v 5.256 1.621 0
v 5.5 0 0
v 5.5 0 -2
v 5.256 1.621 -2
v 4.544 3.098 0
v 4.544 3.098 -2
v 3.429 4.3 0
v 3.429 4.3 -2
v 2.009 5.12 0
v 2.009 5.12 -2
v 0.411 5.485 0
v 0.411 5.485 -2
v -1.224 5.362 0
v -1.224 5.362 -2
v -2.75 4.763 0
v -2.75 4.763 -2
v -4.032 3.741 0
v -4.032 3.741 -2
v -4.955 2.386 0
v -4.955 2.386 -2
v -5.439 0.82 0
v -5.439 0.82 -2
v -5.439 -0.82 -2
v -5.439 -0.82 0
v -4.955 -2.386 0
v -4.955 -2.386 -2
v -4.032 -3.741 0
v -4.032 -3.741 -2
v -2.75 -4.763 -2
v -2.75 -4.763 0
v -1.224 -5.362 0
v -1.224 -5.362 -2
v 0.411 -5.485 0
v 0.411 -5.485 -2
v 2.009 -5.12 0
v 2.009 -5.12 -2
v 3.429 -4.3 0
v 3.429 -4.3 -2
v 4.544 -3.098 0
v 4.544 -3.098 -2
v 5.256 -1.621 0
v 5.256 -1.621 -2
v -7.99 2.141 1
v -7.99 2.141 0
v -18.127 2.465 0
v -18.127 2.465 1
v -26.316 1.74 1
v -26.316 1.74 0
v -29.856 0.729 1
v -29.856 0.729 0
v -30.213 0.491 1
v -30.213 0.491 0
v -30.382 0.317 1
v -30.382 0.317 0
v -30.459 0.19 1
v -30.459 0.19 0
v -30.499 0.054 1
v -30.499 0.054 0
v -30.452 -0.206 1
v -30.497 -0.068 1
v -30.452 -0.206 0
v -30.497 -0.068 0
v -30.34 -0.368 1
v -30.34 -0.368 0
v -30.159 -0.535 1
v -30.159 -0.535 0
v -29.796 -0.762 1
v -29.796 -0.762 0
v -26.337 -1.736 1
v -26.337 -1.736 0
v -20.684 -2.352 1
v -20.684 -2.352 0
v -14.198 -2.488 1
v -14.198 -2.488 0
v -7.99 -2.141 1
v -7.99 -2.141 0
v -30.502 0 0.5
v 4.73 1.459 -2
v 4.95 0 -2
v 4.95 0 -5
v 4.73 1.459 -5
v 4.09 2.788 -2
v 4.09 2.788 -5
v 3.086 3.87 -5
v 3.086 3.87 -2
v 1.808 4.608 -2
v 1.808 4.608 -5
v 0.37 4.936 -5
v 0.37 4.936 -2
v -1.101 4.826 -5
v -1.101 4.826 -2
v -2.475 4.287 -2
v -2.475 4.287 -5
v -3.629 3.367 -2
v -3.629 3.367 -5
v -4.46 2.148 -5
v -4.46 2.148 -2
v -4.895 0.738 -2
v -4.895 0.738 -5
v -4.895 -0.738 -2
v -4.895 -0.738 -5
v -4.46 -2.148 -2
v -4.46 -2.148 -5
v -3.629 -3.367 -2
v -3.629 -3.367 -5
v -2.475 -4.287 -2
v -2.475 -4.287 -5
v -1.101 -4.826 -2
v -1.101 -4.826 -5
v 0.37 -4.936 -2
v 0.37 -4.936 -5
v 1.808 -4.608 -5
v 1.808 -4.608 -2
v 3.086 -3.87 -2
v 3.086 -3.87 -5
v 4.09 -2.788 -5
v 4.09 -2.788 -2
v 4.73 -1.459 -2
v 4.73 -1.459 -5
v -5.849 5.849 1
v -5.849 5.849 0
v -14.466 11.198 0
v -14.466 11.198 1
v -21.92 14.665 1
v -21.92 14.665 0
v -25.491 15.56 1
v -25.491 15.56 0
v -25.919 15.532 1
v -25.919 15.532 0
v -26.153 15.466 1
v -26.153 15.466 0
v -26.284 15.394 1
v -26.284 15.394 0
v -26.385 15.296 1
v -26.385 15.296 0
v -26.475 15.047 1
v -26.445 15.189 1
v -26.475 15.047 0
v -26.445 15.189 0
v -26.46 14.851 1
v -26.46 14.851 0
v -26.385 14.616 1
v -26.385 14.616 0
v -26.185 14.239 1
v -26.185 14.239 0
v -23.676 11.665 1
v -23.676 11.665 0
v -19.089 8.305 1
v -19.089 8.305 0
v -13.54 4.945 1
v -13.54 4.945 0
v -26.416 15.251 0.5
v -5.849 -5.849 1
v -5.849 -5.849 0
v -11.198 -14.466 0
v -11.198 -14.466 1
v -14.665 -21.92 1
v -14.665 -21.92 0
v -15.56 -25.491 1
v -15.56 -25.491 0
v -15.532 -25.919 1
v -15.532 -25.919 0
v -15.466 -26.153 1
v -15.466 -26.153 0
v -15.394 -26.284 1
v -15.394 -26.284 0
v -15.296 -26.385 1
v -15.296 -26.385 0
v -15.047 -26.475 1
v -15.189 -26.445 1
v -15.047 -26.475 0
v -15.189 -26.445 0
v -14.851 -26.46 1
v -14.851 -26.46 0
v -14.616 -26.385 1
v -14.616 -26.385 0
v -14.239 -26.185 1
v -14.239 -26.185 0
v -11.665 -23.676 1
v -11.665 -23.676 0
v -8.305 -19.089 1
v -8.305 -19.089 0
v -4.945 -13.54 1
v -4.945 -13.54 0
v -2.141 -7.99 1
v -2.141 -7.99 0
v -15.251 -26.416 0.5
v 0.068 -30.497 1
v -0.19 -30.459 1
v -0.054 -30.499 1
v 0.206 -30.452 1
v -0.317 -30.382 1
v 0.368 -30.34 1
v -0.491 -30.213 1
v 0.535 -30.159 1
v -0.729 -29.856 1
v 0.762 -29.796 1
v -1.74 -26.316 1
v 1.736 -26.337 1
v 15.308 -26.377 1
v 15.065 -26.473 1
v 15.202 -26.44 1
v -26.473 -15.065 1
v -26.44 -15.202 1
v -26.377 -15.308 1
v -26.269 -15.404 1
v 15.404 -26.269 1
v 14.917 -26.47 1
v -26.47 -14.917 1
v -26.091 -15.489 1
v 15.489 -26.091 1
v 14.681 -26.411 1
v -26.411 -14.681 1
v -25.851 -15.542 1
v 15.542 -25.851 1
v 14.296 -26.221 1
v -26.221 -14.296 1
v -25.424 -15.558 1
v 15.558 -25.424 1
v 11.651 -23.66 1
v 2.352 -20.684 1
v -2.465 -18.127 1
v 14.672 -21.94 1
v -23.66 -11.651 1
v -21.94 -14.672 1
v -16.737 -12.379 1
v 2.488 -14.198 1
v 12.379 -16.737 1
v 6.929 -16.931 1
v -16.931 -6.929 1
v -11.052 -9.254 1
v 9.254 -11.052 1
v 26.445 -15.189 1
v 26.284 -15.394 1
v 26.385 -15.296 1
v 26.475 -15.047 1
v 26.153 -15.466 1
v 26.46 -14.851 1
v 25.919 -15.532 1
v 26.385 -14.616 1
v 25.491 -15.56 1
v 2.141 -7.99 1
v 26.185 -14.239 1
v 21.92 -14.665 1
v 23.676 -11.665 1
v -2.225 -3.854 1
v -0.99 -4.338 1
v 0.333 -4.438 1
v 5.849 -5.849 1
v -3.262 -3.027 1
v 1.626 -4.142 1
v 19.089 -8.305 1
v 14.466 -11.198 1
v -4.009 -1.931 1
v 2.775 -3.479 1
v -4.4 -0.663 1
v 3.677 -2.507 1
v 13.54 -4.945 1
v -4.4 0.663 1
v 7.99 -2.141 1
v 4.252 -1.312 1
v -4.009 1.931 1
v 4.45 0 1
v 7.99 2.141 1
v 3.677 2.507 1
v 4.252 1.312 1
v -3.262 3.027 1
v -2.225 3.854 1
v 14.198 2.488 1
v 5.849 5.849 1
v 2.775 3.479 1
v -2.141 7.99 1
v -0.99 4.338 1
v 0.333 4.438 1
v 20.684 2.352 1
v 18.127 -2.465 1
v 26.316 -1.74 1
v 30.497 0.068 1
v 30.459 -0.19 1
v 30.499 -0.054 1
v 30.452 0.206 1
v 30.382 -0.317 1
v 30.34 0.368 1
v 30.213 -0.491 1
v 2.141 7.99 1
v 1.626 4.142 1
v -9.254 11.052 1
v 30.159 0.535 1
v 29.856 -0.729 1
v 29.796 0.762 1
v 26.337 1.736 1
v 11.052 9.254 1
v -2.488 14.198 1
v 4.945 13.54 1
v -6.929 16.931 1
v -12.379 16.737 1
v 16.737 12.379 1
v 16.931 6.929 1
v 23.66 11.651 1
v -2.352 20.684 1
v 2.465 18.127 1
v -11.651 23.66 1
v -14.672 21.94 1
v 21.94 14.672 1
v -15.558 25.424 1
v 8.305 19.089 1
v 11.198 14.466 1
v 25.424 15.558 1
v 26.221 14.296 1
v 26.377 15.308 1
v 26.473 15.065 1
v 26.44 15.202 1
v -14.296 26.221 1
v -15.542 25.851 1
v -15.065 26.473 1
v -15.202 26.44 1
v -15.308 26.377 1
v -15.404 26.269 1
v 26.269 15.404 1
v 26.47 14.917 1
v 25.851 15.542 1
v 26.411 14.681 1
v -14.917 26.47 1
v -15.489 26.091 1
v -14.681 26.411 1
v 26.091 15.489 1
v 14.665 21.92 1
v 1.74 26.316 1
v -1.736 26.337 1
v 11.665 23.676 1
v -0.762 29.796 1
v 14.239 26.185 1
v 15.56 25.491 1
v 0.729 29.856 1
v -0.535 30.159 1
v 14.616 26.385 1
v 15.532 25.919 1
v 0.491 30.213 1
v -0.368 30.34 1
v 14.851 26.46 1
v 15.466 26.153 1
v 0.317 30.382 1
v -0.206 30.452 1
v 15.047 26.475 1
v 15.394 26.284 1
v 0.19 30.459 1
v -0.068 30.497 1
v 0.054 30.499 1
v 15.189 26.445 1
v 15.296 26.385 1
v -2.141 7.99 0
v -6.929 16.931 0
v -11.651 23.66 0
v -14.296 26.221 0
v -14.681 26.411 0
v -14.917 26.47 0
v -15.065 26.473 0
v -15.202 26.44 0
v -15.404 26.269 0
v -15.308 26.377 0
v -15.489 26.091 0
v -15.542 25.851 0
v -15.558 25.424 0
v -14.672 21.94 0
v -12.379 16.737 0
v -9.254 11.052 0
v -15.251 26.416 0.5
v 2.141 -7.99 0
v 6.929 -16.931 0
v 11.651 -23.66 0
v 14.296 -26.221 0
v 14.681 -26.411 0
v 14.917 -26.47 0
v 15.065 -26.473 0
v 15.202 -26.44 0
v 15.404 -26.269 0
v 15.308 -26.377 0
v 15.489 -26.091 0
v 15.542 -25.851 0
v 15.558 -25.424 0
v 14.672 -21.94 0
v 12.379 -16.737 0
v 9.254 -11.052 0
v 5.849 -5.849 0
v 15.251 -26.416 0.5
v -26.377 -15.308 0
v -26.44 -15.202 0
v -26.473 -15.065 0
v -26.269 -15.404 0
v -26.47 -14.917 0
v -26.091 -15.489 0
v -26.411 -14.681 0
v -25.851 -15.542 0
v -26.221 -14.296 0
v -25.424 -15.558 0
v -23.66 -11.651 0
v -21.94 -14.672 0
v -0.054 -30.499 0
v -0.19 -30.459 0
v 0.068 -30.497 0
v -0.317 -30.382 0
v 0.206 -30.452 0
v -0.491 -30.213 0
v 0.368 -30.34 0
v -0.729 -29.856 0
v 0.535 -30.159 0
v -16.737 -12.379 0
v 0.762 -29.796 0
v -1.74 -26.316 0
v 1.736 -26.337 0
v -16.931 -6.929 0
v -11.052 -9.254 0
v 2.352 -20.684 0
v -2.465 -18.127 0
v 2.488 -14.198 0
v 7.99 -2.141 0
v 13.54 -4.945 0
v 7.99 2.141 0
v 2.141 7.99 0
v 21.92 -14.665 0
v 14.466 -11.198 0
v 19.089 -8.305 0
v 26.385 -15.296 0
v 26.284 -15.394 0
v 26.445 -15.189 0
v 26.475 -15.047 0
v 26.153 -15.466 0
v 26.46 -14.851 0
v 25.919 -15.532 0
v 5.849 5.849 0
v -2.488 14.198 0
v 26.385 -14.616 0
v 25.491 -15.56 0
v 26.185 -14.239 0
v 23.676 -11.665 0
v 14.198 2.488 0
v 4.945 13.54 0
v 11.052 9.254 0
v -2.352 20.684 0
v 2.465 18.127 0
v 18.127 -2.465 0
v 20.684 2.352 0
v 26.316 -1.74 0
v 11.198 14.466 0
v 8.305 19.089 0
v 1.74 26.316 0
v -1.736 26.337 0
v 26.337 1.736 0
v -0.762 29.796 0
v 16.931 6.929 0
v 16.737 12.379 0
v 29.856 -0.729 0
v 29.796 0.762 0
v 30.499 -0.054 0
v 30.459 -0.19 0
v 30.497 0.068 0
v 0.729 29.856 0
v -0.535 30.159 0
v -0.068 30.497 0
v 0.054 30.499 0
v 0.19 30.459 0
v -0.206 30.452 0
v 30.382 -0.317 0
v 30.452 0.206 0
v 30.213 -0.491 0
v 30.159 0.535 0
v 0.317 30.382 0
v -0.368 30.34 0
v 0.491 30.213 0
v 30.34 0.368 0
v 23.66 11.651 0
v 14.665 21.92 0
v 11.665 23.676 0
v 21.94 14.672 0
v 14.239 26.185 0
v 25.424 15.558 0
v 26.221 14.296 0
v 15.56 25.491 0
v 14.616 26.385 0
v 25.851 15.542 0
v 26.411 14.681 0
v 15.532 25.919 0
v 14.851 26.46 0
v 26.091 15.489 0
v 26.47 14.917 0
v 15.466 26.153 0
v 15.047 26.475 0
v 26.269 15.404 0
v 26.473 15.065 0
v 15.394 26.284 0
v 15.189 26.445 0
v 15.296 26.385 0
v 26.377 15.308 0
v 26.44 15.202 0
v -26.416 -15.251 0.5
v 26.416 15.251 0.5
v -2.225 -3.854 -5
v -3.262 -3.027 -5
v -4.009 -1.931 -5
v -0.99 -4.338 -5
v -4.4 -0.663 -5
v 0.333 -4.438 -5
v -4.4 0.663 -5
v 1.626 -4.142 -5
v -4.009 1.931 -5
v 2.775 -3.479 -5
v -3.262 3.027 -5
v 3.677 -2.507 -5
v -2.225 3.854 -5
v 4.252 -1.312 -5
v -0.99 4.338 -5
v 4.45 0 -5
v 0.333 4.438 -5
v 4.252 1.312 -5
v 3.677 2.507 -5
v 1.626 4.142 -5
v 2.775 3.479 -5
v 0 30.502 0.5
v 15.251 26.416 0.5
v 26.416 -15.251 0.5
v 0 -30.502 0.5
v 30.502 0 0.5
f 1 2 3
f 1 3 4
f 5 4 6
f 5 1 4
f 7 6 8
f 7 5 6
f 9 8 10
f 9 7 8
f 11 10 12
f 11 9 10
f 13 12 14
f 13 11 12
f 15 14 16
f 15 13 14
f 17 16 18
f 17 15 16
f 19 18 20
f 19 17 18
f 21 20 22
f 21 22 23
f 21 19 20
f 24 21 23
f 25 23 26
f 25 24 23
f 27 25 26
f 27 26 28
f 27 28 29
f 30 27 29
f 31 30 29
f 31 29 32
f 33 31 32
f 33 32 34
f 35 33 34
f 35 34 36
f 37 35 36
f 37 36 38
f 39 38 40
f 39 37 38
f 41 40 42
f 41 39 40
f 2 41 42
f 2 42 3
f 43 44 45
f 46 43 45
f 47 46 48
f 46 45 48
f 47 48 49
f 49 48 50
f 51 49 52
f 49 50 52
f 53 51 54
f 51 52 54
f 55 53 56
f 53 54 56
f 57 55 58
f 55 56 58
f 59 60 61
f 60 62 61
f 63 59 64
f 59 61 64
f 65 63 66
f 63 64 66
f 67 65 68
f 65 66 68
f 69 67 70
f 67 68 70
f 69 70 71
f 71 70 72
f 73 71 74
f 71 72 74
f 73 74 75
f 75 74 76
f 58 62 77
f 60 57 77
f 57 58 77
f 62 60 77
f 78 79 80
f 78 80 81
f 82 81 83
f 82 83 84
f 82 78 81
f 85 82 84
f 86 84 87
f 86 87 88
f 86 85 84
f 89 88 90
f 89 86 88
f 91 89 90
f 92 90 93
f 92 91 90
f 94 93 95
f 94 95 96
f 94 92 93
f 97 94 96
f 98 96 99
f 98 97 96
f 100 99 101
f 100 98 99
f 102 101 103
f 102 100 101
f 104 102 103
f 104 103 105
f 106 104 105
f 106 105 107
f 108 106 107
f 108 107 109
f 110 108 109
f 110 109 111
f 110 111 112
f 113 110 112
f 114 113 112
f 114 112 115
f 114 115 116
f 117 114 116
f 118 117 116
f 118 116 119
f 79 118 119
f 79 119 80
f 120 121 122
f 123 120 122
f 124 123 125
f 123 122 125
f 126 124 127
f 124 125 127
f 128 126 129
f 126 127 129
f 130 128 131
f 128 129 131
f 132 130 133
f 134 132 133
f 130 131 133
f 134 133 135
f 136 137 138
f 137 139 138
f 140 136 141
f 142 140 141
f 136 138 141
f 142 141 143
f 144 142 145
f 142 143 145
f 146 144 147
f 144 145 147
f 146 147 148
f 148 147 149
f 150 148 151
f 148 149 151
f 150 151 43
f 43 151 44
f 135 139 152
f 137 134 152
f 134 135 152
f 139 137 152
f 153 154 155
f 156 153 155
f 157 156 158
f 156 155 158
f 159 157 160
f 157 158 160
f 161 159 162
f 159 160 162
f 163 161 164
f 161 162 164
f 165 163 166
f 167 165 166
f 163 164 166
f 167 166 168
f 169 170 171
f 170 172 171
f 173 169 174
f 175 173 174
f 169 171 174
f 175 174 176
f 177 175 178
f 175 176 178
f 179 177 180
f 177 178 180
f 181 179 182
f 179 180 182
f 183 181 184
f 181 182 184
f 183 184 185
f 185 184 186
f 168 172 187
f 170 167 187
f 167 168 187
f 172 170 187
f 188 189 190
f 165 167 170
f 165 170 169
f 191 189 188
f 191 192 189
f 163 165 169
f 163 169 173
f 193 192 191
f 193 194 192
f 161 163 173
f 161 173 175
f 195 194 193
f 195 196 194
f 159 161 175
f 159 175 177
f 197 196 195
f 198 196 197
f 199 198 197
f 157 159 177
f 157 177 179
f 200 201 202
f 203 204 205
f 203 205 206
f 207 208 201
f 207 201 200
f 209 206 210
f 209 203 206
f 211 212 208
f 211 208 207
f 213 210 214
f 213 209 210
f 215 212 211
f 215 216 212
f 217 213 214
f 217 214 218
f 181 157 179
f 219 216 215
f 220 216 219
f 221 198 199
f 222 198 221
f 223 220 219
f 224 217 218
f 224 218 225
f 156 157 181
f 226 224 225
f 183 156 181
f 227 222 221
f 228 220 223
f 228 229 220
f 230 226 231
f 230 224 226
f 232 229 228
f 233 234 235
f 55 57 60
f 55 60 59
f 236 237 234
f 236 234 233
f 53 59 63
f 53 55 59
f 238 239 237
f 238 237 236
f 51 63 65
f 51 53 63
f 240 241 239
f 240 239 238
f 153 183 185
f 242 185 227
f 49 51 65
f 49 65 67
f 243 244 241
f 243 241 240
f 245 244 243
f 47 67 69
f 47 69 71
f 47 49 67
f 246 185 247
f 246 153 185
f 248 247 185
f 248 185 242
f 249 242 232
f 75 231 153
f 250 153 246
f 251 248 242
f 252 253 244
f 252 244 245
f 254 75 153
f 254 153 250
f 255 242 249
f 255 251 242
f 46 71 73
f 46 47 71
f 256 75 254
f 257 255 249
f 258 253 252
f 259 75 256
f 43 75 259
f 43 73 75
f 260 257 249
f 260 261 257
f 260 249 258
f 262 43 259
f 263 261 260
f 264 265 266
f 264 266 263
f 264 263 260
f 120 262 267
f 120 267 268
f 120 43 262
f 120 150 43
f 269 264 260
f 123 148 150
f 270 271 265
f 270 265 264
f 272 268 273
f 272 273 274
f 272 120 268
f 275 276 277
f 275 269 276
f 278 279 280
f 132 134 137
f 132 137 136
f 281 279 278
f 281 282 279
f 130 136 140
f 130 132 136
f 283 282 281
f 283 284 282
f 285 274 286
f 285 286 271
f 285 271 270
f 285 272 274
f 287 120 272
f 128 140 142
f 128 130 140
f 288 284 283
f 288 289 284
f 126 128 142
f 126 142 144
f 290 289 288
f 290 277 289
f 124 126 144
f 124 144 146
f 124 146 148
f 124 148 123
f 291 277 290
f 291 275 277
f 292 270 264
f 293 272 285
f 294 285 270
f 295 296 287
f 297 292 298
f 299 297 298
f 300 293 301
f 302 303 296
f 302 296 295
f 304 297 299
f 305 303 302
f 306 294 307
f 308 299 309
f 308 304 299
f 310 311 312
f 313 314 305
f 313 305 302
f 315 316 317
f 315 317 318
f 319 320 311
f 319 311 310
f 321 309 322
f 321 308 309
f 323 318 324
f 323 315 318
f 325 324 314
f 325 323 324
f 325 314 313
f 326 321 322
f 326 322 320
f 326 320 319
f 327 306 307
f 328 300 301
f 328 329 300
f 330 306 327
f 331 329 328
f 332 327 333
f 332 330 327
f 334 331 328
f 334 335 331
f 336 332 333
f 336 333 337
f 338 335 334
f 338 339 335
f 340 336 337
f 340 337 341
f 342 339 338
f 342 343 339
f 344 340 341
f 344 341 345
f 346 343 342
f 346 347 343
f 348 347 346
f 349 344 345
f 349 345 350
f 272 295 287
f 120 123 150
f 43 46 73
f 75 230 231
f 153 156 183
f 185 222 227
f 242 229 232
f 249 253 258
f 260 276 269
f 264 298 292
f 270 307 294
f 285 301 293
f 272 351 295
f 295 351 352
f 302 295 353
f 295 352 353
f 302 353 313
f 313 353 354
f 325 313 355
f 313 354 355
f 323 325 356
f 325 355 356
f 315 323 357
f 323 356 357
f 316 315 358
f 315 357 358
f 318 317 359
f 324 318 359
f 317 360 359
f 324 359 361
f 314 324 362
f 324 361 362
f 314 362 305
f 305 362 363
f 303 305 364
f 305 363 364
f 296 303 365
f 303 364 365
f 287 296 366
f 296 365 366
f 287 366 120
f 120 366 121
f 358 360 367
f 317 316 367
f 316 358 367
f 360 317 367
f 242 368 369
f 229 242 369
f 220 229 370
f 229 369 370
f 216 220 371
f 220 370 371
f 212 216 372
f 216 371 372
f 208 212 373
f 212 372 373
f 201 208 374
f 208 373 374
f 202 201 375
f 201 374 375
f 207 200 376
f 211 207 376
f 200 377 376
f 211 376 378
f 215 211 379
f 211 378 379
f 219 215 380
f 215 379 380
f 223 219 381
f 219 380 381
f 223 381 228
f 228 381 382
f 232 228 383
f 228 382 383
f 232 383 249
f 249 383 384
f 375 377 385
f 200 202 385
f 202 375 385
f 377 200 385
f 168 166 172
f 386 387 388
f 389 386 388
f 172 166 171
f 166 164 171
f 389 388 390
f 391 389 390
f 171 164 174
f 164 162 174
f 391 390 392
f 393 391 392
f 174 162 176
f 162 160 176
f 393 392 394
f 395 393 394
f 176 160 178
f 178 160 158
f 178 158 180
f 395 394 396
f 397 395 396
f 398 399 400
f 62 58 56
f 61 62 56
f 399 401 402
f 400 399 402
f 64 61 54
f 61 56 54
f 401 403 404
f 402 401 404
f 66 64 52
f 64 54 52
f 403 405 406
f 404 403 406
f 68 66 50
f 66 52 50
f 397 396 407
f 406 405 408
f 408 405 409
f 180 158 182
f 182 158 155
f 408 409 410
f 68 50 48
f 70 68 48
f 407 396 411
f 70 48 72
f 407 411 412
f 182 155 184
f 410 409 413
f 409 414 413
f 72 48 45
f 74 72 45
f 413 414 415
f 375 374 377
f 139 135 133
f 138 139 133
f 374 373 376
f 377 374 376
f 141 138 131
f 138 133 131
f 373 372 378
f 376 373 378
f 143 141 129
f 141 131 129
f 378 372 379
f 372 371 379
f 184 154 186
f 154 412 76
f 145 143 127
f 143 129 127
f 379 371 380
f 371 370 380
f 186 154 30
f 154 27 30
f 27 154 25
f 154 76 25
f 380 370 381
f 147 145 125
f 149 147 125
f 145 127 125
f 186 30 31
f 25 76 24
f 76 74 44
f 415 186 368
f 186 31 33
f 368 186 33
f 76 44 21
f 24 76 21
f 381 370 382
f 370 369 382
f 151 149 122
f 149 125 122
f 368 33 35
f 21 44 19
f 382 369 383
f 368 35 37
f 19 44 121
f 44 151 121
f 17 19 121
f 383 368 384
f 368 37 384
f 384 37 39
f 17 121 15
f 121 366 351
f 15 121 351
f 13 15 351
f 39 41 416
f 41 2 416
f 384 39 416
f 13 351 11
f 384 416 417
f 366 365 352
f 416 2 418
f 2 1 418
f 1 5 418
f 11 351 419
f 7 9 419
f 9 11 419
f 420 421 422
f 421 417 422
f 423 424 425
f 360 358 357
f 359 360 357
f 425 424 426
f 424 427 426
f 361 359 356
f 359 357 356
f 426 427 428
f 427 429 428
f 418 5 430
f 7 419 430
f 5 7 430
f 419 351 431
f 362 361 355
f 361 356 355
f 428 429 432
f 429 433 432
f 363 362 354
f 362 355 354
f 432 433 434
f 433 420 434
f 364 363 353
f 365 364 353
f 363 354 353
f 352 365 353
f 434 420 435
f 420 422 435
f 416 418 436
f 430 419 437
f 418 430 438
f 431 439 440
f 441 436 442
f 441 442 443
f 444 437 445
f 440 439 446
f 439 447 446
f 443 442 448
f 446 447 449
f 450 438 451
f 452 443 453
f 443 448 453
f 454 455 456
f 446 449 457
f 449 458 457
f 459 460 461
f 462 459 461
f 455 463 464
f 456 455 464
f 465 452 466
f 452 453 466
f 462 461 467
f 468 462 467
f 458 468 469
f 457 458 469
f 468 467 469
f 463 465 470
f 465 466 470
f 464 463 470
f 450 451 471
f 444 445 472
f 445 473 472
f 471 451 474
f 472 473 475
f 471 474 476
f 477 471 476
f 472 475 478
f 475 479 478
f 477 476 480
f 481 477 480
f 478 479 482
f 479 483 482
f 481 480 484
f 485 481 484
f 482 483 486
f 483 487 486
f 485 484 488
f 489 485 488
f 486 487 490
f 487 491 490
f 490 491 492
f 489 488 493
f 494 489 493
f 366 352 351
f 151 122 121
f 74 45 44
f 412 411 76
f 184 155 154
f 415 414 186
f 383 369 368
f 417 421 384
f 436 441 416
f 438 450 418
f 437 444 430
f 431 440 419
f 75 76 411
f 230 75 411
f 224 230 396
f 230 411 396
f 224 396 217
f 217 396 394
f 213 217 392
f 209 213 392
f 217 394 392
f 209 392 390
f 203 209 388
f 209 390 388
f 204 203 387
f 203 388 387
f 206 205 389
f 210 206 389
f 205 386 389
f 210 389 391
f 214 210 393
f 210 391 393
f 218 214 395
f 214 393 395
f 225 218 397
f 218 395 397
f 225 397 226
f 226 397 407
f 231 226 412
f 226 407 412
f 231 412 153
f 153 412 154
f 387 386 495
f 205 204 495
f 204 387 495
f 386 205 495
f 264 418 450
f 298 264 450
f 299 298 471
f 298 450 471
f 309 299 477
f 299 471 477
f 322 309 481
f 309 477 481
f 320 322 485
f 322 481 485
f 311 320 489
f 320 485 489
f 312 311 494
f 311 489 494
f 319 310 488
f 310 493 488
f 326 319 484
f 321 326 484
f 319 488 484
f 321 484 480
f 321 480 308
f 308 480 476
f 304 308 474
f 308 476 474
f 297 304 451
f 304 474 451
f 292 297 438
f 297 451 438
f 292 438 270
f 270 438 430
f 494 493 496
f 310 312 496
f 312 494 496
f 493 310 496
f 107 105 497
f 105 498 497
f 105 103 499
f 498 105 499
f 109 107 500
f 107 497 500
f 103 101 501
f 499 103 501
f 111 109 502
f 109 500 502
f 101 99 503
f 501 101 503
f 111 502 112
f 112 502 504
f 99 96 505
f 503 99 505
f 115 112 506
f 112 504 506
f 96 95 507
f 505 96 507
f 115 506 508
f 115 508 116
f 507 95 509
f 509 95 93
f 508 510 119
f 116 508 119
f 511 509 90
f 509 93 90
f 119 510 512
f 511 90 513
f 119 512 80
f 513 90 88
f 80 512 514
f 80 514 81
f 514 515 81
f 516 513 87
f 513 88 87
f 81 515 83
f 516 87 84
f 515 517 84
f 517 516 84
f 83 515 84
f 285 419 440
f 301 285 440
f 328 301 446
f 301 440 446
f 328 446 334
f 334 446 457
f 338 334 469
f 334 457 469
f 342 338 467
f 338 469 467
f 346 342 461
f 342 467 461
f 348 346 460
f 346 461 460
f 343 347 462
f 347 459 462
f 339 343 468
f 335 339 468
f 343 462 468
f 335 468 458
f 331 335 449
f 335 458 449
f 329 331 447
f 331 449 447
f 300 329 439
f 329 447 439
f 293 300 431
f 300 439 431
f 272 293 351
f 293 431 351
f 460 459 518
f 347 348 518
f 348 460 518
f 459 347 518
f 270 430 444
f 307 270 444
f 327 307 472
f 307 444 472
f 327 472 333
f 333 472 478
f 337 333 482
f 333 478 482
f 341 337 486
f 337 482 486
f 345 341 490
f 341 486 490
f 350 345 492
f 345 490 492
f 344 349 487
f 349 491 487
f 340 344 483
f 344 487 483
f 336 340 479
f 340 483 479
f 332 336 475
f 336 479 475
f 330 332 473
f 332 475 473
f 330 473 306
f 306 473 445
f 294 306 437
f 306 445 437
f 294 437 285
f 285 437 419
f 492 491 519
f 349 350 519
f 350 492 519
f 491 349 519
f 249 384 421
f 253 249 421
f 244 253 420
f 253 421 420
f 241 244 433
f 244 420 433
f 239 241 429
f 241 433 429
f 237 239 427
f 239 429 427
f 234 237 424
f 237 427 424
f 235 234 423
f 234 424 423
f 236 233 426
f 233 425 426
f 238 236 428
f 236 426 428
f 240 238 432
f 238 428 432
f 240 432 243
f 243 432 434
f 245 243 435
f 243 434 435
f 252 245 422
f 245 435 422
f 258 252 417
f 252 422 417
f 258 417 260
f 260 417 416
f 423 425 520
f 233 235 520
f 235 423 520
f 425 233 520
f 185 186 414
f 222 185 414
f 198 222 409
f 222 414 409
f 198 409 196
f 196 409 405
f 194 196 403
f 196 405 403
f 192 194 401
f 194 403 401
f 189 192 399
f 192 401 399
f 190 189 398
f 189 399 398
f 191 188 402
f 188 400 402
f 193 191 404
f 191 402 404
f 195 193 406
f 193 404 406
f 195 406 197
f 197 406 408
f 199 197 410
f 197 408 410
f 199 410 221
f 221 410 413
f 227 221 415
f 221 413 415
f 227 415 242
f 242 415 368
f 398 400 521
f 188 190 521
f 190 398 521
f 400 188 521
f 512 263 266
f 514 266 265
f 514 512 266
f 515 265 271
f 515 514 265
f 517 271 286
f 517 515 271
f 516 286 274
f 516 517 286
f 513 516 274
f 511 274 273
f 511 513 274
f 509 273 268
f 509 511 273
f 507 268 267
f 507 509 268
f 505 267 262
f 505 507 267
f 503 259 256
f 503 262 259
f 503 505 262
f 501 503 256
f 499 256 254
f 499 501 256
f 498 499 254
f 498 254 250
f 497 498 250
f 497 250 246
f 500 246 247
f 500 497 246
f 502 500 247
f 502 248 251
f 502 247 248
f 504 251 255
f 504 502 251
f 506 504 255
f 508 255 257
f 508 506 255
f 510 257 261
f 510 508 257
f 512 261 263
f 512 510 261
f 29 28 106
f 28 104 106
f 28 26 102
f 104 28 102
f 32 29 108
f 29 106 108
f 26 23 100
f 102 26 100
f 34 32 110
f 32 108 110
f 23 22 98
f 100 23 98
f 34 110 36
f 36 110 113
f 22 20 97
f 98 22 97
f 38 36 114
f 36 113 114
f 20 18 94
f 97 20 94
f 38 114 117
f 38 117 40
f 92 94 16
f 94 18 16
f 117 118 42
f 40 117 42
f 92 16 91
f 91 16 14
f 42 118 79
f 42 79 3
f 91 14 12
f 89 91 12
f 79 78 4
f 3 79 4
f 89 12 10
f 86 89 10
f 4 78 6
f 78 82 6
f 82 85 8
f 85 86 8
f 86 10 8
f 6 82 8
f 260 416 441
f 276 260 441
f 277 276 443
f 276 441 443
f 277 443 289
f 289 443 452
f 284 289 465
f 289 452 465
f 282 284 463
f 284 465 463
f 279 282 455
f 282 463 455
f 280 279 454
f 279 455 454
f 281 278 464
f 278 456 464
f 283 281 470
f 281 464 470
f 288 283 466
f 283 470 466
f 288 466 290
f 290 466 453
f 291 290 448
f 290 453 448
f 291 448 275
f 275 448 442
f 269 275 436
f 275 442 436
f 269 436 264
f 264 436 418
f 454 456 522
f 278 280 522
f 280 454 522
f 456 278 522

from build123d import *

# Parameters (mm, degrees)
F1_DEPTH = 1
F3_COUNT = 12
F4_R     = 4.95
F4_R_2   = 4.45
F5_DEPTH = 5
F4_R_3   = 5.5
F6_DEPTH = 2
F7_DEPTH = 2


with BuildPart() as f1:
    # F0 (on Top) → F1 (new body)
    with BuildSketch(Plane.XY):
        with BuildLine():
            ThreePointArc((-1.85543281, 5.7059065088), (-3.5261454267, -4.8545132022), (6, 0))
            ThreePointArc((6, 0), (4.8545132022, 3.5261454267), (1.85543281, 5.7059065088))
            add(Edge.make_bspline(
                [(0, 0.8097463206), (1.110899103, 0.8097463206), (1.85543281, 5.7059065088)],
                knots=[0, 0, 0, 0.8363070245, 0.8363070245, 0.8363070245], degree=2, weights=[1, 0.913840308, 1]))
            add(Edge.make_bspline(
                [(-1.85543281, 5.7059065088), (-1.110899103, 0.8097463206), (0, 0.8097463206)],
                knots=[5.4468782827, 5.4468782827, 5.4468782827, 6.2831853072, 6.2831853072, 6.2831853072], degree=2, weights=[1, 0.913840308, 1]))
        make_face()
        with BuildLine():
            ThreePointArc((-1.85543281, 5.7059065088), (0, 6), (1.85543281, 5.7059065088))
            add(Edge.make_bspline(
                [(1.85543281, 5.7059065088), (5.626073496, 30.50217918), (0, 30.50217918), (-5.626073496, 30.50217918), (-1.85543281, 5.7059065088)],
                knots=[0.8363070245, 0.8363070245, 0.8363070245, 3.1415926536, 3.1415926536, 5.4468782827, 5.4468782827, 5.4468782827], degree=2, weights=[1, 0.4060737514, 1, 0.4060737514, 1]))
        make_face()
        with BuildLine():
            add(Edge.make_bspline(
                [(0, 0.8097463206), (1.110899103, 0.8097463206), (1.85543281, 5.7059065088)],
                knots=[0, 0, 0, 0.8363070245, 0.8363070245, 0.8363070245], degree=2, weights=[1, 0.913840308, 1]))
            ThreePointArc((1.85543281, 5.7059065088), (0, 6), (-1.85543281, 5.7059065088))
            add(Edge.make_bspline(
                [(-1.85543281, 5.7059065088), (-1.110899103, 0.8097463206), (0, 0.8097463206)],
                knots=[5.4468782827, 5.4468782827, 5.4468782827, 6.2831853072, 6.2831853072, 6.2831853072], degree=2, weights=[1, 0.913840308, 1]))
        make_face()
    extrude(amount=F1_DEPTH)


with BuildPart() as f3_1:
    # F3: instance of F1
    add(f1.part.rotate(Axis((0, 0, 8.796742186), (0, 0, -1)), 1 * 360 / F3_COUNT))


with BuildPart() as f3_2:
    # F3: instance of F1
    add(f1.part.rotate(Axis((0, 0, 8.796742186), (0, 0, -1)), 2 * 360 / F3_COUNT))


with BuildPart() as f3_3:
    # F3: instance of F1
    add(f1.part.rotate(Axis((0, 0, 8.796742186), (0, 0, -1)), 3 * 360 / F3_COUNT))


with BuildPart() as f3_4:
    # F3: instance of F1
    add(f1.part.rotate(Axis((0, 0, 8.796742186), (0, 0, -1)), 4 * 360 / F3_COUNT))


with BuildPart() as f3_5:
    # F3: instance of F1
    add(f1.part.rotate(Axis((0, 0, 8.796742186), (0, 0, -1)), 5 * 360 / F3_COUNT))


with BuildPart() as f3_6:
    # F3: instance of F1
    add(f1.part.rotate(Axis((0, 0, 8.796742186), (0, 0, -1)), 6 * 360 / F3_COUNT))


with BuildPart() as f3_7:
    # F3: instance of F1
    add(f1.part.rotate(Axis((0, 0, 8.796742186), (0, 0, -1)), 7 * 360 / F3_COUNT))


with BuildPart() as f3_8:
    # F3: instance of F1
    add(f1.part.rotate(Axis((0, 0, 8.796742186), (0, 0, -1)), 8 * 360 / F3_COUNT))


with BuildPart() as f3_9:
    # F3: instance of F1
    add(f1.part.rotate(Axis((0, 0, 8.796742186), (0, 0, -1)), 9 * 360 / F3_COUNT))


with BuildPart() as f3_10:
    # F3: instance of F1
    add(f1.part.rotate(Axis((0, 0, 8.796742186), (0, 0, -1)), 10 * 360 / F3_COUNT))


with BuildPart() as f3_11:
    # F3: instance of F1
    add(f1.part.rotate(Axis((0, 0, 8.796742186), (0, 0, -1)), 11 * 360 / F3_COUNT))


with BuildPart() as f1_1:
    add(f1.part)

    add(f3_1.part)  # F5 merges F3_1

    add(f3_2.part)  # F5 merges F3_2

    add(f3_3.part)  # F5 merges F3_3

    add(f3_4.part)  # F5 merges F3_4

    add(f3_5.part)  # F5 merges F3_5

    add(f3_6.part)  # F5 merges F3_6

    add(f3_7.part)  # F5 merges F3_7

    add(f3_8.part)  # F5 merges F3_8

    add(f3_9.part)  # F5 merges F3_9

    add(f3_10.part)  # F5 merges F3_10

    add(f3_11.part)  # F5 merges F3_11
    # F4 (on Top) → F5 (join)
    with BuildSketch(Plane.XY):
        Circle(F4_R)
        Circle(F4_R_2, mode=Mode.SUBTRACT)
    extrude(amount=-F5_DEPTH)

    # F4 (on Top) → F6 (join)
    with BuildSketch(Plane.XY):
        Circle(F4_R_3)
        Circle(F4_R, mode=Mode.SUBTRACT)
    extrude(amount=-F6_DEPTH)

    # F4 (on Top) → F7 (cut)
    with BuildSketch(Plane.XY):
        Circle(F4_R_2)
    extrude(amount=F7_DEPTH, mode=Mode.SUBTRACT)


solid = f1_1.part
